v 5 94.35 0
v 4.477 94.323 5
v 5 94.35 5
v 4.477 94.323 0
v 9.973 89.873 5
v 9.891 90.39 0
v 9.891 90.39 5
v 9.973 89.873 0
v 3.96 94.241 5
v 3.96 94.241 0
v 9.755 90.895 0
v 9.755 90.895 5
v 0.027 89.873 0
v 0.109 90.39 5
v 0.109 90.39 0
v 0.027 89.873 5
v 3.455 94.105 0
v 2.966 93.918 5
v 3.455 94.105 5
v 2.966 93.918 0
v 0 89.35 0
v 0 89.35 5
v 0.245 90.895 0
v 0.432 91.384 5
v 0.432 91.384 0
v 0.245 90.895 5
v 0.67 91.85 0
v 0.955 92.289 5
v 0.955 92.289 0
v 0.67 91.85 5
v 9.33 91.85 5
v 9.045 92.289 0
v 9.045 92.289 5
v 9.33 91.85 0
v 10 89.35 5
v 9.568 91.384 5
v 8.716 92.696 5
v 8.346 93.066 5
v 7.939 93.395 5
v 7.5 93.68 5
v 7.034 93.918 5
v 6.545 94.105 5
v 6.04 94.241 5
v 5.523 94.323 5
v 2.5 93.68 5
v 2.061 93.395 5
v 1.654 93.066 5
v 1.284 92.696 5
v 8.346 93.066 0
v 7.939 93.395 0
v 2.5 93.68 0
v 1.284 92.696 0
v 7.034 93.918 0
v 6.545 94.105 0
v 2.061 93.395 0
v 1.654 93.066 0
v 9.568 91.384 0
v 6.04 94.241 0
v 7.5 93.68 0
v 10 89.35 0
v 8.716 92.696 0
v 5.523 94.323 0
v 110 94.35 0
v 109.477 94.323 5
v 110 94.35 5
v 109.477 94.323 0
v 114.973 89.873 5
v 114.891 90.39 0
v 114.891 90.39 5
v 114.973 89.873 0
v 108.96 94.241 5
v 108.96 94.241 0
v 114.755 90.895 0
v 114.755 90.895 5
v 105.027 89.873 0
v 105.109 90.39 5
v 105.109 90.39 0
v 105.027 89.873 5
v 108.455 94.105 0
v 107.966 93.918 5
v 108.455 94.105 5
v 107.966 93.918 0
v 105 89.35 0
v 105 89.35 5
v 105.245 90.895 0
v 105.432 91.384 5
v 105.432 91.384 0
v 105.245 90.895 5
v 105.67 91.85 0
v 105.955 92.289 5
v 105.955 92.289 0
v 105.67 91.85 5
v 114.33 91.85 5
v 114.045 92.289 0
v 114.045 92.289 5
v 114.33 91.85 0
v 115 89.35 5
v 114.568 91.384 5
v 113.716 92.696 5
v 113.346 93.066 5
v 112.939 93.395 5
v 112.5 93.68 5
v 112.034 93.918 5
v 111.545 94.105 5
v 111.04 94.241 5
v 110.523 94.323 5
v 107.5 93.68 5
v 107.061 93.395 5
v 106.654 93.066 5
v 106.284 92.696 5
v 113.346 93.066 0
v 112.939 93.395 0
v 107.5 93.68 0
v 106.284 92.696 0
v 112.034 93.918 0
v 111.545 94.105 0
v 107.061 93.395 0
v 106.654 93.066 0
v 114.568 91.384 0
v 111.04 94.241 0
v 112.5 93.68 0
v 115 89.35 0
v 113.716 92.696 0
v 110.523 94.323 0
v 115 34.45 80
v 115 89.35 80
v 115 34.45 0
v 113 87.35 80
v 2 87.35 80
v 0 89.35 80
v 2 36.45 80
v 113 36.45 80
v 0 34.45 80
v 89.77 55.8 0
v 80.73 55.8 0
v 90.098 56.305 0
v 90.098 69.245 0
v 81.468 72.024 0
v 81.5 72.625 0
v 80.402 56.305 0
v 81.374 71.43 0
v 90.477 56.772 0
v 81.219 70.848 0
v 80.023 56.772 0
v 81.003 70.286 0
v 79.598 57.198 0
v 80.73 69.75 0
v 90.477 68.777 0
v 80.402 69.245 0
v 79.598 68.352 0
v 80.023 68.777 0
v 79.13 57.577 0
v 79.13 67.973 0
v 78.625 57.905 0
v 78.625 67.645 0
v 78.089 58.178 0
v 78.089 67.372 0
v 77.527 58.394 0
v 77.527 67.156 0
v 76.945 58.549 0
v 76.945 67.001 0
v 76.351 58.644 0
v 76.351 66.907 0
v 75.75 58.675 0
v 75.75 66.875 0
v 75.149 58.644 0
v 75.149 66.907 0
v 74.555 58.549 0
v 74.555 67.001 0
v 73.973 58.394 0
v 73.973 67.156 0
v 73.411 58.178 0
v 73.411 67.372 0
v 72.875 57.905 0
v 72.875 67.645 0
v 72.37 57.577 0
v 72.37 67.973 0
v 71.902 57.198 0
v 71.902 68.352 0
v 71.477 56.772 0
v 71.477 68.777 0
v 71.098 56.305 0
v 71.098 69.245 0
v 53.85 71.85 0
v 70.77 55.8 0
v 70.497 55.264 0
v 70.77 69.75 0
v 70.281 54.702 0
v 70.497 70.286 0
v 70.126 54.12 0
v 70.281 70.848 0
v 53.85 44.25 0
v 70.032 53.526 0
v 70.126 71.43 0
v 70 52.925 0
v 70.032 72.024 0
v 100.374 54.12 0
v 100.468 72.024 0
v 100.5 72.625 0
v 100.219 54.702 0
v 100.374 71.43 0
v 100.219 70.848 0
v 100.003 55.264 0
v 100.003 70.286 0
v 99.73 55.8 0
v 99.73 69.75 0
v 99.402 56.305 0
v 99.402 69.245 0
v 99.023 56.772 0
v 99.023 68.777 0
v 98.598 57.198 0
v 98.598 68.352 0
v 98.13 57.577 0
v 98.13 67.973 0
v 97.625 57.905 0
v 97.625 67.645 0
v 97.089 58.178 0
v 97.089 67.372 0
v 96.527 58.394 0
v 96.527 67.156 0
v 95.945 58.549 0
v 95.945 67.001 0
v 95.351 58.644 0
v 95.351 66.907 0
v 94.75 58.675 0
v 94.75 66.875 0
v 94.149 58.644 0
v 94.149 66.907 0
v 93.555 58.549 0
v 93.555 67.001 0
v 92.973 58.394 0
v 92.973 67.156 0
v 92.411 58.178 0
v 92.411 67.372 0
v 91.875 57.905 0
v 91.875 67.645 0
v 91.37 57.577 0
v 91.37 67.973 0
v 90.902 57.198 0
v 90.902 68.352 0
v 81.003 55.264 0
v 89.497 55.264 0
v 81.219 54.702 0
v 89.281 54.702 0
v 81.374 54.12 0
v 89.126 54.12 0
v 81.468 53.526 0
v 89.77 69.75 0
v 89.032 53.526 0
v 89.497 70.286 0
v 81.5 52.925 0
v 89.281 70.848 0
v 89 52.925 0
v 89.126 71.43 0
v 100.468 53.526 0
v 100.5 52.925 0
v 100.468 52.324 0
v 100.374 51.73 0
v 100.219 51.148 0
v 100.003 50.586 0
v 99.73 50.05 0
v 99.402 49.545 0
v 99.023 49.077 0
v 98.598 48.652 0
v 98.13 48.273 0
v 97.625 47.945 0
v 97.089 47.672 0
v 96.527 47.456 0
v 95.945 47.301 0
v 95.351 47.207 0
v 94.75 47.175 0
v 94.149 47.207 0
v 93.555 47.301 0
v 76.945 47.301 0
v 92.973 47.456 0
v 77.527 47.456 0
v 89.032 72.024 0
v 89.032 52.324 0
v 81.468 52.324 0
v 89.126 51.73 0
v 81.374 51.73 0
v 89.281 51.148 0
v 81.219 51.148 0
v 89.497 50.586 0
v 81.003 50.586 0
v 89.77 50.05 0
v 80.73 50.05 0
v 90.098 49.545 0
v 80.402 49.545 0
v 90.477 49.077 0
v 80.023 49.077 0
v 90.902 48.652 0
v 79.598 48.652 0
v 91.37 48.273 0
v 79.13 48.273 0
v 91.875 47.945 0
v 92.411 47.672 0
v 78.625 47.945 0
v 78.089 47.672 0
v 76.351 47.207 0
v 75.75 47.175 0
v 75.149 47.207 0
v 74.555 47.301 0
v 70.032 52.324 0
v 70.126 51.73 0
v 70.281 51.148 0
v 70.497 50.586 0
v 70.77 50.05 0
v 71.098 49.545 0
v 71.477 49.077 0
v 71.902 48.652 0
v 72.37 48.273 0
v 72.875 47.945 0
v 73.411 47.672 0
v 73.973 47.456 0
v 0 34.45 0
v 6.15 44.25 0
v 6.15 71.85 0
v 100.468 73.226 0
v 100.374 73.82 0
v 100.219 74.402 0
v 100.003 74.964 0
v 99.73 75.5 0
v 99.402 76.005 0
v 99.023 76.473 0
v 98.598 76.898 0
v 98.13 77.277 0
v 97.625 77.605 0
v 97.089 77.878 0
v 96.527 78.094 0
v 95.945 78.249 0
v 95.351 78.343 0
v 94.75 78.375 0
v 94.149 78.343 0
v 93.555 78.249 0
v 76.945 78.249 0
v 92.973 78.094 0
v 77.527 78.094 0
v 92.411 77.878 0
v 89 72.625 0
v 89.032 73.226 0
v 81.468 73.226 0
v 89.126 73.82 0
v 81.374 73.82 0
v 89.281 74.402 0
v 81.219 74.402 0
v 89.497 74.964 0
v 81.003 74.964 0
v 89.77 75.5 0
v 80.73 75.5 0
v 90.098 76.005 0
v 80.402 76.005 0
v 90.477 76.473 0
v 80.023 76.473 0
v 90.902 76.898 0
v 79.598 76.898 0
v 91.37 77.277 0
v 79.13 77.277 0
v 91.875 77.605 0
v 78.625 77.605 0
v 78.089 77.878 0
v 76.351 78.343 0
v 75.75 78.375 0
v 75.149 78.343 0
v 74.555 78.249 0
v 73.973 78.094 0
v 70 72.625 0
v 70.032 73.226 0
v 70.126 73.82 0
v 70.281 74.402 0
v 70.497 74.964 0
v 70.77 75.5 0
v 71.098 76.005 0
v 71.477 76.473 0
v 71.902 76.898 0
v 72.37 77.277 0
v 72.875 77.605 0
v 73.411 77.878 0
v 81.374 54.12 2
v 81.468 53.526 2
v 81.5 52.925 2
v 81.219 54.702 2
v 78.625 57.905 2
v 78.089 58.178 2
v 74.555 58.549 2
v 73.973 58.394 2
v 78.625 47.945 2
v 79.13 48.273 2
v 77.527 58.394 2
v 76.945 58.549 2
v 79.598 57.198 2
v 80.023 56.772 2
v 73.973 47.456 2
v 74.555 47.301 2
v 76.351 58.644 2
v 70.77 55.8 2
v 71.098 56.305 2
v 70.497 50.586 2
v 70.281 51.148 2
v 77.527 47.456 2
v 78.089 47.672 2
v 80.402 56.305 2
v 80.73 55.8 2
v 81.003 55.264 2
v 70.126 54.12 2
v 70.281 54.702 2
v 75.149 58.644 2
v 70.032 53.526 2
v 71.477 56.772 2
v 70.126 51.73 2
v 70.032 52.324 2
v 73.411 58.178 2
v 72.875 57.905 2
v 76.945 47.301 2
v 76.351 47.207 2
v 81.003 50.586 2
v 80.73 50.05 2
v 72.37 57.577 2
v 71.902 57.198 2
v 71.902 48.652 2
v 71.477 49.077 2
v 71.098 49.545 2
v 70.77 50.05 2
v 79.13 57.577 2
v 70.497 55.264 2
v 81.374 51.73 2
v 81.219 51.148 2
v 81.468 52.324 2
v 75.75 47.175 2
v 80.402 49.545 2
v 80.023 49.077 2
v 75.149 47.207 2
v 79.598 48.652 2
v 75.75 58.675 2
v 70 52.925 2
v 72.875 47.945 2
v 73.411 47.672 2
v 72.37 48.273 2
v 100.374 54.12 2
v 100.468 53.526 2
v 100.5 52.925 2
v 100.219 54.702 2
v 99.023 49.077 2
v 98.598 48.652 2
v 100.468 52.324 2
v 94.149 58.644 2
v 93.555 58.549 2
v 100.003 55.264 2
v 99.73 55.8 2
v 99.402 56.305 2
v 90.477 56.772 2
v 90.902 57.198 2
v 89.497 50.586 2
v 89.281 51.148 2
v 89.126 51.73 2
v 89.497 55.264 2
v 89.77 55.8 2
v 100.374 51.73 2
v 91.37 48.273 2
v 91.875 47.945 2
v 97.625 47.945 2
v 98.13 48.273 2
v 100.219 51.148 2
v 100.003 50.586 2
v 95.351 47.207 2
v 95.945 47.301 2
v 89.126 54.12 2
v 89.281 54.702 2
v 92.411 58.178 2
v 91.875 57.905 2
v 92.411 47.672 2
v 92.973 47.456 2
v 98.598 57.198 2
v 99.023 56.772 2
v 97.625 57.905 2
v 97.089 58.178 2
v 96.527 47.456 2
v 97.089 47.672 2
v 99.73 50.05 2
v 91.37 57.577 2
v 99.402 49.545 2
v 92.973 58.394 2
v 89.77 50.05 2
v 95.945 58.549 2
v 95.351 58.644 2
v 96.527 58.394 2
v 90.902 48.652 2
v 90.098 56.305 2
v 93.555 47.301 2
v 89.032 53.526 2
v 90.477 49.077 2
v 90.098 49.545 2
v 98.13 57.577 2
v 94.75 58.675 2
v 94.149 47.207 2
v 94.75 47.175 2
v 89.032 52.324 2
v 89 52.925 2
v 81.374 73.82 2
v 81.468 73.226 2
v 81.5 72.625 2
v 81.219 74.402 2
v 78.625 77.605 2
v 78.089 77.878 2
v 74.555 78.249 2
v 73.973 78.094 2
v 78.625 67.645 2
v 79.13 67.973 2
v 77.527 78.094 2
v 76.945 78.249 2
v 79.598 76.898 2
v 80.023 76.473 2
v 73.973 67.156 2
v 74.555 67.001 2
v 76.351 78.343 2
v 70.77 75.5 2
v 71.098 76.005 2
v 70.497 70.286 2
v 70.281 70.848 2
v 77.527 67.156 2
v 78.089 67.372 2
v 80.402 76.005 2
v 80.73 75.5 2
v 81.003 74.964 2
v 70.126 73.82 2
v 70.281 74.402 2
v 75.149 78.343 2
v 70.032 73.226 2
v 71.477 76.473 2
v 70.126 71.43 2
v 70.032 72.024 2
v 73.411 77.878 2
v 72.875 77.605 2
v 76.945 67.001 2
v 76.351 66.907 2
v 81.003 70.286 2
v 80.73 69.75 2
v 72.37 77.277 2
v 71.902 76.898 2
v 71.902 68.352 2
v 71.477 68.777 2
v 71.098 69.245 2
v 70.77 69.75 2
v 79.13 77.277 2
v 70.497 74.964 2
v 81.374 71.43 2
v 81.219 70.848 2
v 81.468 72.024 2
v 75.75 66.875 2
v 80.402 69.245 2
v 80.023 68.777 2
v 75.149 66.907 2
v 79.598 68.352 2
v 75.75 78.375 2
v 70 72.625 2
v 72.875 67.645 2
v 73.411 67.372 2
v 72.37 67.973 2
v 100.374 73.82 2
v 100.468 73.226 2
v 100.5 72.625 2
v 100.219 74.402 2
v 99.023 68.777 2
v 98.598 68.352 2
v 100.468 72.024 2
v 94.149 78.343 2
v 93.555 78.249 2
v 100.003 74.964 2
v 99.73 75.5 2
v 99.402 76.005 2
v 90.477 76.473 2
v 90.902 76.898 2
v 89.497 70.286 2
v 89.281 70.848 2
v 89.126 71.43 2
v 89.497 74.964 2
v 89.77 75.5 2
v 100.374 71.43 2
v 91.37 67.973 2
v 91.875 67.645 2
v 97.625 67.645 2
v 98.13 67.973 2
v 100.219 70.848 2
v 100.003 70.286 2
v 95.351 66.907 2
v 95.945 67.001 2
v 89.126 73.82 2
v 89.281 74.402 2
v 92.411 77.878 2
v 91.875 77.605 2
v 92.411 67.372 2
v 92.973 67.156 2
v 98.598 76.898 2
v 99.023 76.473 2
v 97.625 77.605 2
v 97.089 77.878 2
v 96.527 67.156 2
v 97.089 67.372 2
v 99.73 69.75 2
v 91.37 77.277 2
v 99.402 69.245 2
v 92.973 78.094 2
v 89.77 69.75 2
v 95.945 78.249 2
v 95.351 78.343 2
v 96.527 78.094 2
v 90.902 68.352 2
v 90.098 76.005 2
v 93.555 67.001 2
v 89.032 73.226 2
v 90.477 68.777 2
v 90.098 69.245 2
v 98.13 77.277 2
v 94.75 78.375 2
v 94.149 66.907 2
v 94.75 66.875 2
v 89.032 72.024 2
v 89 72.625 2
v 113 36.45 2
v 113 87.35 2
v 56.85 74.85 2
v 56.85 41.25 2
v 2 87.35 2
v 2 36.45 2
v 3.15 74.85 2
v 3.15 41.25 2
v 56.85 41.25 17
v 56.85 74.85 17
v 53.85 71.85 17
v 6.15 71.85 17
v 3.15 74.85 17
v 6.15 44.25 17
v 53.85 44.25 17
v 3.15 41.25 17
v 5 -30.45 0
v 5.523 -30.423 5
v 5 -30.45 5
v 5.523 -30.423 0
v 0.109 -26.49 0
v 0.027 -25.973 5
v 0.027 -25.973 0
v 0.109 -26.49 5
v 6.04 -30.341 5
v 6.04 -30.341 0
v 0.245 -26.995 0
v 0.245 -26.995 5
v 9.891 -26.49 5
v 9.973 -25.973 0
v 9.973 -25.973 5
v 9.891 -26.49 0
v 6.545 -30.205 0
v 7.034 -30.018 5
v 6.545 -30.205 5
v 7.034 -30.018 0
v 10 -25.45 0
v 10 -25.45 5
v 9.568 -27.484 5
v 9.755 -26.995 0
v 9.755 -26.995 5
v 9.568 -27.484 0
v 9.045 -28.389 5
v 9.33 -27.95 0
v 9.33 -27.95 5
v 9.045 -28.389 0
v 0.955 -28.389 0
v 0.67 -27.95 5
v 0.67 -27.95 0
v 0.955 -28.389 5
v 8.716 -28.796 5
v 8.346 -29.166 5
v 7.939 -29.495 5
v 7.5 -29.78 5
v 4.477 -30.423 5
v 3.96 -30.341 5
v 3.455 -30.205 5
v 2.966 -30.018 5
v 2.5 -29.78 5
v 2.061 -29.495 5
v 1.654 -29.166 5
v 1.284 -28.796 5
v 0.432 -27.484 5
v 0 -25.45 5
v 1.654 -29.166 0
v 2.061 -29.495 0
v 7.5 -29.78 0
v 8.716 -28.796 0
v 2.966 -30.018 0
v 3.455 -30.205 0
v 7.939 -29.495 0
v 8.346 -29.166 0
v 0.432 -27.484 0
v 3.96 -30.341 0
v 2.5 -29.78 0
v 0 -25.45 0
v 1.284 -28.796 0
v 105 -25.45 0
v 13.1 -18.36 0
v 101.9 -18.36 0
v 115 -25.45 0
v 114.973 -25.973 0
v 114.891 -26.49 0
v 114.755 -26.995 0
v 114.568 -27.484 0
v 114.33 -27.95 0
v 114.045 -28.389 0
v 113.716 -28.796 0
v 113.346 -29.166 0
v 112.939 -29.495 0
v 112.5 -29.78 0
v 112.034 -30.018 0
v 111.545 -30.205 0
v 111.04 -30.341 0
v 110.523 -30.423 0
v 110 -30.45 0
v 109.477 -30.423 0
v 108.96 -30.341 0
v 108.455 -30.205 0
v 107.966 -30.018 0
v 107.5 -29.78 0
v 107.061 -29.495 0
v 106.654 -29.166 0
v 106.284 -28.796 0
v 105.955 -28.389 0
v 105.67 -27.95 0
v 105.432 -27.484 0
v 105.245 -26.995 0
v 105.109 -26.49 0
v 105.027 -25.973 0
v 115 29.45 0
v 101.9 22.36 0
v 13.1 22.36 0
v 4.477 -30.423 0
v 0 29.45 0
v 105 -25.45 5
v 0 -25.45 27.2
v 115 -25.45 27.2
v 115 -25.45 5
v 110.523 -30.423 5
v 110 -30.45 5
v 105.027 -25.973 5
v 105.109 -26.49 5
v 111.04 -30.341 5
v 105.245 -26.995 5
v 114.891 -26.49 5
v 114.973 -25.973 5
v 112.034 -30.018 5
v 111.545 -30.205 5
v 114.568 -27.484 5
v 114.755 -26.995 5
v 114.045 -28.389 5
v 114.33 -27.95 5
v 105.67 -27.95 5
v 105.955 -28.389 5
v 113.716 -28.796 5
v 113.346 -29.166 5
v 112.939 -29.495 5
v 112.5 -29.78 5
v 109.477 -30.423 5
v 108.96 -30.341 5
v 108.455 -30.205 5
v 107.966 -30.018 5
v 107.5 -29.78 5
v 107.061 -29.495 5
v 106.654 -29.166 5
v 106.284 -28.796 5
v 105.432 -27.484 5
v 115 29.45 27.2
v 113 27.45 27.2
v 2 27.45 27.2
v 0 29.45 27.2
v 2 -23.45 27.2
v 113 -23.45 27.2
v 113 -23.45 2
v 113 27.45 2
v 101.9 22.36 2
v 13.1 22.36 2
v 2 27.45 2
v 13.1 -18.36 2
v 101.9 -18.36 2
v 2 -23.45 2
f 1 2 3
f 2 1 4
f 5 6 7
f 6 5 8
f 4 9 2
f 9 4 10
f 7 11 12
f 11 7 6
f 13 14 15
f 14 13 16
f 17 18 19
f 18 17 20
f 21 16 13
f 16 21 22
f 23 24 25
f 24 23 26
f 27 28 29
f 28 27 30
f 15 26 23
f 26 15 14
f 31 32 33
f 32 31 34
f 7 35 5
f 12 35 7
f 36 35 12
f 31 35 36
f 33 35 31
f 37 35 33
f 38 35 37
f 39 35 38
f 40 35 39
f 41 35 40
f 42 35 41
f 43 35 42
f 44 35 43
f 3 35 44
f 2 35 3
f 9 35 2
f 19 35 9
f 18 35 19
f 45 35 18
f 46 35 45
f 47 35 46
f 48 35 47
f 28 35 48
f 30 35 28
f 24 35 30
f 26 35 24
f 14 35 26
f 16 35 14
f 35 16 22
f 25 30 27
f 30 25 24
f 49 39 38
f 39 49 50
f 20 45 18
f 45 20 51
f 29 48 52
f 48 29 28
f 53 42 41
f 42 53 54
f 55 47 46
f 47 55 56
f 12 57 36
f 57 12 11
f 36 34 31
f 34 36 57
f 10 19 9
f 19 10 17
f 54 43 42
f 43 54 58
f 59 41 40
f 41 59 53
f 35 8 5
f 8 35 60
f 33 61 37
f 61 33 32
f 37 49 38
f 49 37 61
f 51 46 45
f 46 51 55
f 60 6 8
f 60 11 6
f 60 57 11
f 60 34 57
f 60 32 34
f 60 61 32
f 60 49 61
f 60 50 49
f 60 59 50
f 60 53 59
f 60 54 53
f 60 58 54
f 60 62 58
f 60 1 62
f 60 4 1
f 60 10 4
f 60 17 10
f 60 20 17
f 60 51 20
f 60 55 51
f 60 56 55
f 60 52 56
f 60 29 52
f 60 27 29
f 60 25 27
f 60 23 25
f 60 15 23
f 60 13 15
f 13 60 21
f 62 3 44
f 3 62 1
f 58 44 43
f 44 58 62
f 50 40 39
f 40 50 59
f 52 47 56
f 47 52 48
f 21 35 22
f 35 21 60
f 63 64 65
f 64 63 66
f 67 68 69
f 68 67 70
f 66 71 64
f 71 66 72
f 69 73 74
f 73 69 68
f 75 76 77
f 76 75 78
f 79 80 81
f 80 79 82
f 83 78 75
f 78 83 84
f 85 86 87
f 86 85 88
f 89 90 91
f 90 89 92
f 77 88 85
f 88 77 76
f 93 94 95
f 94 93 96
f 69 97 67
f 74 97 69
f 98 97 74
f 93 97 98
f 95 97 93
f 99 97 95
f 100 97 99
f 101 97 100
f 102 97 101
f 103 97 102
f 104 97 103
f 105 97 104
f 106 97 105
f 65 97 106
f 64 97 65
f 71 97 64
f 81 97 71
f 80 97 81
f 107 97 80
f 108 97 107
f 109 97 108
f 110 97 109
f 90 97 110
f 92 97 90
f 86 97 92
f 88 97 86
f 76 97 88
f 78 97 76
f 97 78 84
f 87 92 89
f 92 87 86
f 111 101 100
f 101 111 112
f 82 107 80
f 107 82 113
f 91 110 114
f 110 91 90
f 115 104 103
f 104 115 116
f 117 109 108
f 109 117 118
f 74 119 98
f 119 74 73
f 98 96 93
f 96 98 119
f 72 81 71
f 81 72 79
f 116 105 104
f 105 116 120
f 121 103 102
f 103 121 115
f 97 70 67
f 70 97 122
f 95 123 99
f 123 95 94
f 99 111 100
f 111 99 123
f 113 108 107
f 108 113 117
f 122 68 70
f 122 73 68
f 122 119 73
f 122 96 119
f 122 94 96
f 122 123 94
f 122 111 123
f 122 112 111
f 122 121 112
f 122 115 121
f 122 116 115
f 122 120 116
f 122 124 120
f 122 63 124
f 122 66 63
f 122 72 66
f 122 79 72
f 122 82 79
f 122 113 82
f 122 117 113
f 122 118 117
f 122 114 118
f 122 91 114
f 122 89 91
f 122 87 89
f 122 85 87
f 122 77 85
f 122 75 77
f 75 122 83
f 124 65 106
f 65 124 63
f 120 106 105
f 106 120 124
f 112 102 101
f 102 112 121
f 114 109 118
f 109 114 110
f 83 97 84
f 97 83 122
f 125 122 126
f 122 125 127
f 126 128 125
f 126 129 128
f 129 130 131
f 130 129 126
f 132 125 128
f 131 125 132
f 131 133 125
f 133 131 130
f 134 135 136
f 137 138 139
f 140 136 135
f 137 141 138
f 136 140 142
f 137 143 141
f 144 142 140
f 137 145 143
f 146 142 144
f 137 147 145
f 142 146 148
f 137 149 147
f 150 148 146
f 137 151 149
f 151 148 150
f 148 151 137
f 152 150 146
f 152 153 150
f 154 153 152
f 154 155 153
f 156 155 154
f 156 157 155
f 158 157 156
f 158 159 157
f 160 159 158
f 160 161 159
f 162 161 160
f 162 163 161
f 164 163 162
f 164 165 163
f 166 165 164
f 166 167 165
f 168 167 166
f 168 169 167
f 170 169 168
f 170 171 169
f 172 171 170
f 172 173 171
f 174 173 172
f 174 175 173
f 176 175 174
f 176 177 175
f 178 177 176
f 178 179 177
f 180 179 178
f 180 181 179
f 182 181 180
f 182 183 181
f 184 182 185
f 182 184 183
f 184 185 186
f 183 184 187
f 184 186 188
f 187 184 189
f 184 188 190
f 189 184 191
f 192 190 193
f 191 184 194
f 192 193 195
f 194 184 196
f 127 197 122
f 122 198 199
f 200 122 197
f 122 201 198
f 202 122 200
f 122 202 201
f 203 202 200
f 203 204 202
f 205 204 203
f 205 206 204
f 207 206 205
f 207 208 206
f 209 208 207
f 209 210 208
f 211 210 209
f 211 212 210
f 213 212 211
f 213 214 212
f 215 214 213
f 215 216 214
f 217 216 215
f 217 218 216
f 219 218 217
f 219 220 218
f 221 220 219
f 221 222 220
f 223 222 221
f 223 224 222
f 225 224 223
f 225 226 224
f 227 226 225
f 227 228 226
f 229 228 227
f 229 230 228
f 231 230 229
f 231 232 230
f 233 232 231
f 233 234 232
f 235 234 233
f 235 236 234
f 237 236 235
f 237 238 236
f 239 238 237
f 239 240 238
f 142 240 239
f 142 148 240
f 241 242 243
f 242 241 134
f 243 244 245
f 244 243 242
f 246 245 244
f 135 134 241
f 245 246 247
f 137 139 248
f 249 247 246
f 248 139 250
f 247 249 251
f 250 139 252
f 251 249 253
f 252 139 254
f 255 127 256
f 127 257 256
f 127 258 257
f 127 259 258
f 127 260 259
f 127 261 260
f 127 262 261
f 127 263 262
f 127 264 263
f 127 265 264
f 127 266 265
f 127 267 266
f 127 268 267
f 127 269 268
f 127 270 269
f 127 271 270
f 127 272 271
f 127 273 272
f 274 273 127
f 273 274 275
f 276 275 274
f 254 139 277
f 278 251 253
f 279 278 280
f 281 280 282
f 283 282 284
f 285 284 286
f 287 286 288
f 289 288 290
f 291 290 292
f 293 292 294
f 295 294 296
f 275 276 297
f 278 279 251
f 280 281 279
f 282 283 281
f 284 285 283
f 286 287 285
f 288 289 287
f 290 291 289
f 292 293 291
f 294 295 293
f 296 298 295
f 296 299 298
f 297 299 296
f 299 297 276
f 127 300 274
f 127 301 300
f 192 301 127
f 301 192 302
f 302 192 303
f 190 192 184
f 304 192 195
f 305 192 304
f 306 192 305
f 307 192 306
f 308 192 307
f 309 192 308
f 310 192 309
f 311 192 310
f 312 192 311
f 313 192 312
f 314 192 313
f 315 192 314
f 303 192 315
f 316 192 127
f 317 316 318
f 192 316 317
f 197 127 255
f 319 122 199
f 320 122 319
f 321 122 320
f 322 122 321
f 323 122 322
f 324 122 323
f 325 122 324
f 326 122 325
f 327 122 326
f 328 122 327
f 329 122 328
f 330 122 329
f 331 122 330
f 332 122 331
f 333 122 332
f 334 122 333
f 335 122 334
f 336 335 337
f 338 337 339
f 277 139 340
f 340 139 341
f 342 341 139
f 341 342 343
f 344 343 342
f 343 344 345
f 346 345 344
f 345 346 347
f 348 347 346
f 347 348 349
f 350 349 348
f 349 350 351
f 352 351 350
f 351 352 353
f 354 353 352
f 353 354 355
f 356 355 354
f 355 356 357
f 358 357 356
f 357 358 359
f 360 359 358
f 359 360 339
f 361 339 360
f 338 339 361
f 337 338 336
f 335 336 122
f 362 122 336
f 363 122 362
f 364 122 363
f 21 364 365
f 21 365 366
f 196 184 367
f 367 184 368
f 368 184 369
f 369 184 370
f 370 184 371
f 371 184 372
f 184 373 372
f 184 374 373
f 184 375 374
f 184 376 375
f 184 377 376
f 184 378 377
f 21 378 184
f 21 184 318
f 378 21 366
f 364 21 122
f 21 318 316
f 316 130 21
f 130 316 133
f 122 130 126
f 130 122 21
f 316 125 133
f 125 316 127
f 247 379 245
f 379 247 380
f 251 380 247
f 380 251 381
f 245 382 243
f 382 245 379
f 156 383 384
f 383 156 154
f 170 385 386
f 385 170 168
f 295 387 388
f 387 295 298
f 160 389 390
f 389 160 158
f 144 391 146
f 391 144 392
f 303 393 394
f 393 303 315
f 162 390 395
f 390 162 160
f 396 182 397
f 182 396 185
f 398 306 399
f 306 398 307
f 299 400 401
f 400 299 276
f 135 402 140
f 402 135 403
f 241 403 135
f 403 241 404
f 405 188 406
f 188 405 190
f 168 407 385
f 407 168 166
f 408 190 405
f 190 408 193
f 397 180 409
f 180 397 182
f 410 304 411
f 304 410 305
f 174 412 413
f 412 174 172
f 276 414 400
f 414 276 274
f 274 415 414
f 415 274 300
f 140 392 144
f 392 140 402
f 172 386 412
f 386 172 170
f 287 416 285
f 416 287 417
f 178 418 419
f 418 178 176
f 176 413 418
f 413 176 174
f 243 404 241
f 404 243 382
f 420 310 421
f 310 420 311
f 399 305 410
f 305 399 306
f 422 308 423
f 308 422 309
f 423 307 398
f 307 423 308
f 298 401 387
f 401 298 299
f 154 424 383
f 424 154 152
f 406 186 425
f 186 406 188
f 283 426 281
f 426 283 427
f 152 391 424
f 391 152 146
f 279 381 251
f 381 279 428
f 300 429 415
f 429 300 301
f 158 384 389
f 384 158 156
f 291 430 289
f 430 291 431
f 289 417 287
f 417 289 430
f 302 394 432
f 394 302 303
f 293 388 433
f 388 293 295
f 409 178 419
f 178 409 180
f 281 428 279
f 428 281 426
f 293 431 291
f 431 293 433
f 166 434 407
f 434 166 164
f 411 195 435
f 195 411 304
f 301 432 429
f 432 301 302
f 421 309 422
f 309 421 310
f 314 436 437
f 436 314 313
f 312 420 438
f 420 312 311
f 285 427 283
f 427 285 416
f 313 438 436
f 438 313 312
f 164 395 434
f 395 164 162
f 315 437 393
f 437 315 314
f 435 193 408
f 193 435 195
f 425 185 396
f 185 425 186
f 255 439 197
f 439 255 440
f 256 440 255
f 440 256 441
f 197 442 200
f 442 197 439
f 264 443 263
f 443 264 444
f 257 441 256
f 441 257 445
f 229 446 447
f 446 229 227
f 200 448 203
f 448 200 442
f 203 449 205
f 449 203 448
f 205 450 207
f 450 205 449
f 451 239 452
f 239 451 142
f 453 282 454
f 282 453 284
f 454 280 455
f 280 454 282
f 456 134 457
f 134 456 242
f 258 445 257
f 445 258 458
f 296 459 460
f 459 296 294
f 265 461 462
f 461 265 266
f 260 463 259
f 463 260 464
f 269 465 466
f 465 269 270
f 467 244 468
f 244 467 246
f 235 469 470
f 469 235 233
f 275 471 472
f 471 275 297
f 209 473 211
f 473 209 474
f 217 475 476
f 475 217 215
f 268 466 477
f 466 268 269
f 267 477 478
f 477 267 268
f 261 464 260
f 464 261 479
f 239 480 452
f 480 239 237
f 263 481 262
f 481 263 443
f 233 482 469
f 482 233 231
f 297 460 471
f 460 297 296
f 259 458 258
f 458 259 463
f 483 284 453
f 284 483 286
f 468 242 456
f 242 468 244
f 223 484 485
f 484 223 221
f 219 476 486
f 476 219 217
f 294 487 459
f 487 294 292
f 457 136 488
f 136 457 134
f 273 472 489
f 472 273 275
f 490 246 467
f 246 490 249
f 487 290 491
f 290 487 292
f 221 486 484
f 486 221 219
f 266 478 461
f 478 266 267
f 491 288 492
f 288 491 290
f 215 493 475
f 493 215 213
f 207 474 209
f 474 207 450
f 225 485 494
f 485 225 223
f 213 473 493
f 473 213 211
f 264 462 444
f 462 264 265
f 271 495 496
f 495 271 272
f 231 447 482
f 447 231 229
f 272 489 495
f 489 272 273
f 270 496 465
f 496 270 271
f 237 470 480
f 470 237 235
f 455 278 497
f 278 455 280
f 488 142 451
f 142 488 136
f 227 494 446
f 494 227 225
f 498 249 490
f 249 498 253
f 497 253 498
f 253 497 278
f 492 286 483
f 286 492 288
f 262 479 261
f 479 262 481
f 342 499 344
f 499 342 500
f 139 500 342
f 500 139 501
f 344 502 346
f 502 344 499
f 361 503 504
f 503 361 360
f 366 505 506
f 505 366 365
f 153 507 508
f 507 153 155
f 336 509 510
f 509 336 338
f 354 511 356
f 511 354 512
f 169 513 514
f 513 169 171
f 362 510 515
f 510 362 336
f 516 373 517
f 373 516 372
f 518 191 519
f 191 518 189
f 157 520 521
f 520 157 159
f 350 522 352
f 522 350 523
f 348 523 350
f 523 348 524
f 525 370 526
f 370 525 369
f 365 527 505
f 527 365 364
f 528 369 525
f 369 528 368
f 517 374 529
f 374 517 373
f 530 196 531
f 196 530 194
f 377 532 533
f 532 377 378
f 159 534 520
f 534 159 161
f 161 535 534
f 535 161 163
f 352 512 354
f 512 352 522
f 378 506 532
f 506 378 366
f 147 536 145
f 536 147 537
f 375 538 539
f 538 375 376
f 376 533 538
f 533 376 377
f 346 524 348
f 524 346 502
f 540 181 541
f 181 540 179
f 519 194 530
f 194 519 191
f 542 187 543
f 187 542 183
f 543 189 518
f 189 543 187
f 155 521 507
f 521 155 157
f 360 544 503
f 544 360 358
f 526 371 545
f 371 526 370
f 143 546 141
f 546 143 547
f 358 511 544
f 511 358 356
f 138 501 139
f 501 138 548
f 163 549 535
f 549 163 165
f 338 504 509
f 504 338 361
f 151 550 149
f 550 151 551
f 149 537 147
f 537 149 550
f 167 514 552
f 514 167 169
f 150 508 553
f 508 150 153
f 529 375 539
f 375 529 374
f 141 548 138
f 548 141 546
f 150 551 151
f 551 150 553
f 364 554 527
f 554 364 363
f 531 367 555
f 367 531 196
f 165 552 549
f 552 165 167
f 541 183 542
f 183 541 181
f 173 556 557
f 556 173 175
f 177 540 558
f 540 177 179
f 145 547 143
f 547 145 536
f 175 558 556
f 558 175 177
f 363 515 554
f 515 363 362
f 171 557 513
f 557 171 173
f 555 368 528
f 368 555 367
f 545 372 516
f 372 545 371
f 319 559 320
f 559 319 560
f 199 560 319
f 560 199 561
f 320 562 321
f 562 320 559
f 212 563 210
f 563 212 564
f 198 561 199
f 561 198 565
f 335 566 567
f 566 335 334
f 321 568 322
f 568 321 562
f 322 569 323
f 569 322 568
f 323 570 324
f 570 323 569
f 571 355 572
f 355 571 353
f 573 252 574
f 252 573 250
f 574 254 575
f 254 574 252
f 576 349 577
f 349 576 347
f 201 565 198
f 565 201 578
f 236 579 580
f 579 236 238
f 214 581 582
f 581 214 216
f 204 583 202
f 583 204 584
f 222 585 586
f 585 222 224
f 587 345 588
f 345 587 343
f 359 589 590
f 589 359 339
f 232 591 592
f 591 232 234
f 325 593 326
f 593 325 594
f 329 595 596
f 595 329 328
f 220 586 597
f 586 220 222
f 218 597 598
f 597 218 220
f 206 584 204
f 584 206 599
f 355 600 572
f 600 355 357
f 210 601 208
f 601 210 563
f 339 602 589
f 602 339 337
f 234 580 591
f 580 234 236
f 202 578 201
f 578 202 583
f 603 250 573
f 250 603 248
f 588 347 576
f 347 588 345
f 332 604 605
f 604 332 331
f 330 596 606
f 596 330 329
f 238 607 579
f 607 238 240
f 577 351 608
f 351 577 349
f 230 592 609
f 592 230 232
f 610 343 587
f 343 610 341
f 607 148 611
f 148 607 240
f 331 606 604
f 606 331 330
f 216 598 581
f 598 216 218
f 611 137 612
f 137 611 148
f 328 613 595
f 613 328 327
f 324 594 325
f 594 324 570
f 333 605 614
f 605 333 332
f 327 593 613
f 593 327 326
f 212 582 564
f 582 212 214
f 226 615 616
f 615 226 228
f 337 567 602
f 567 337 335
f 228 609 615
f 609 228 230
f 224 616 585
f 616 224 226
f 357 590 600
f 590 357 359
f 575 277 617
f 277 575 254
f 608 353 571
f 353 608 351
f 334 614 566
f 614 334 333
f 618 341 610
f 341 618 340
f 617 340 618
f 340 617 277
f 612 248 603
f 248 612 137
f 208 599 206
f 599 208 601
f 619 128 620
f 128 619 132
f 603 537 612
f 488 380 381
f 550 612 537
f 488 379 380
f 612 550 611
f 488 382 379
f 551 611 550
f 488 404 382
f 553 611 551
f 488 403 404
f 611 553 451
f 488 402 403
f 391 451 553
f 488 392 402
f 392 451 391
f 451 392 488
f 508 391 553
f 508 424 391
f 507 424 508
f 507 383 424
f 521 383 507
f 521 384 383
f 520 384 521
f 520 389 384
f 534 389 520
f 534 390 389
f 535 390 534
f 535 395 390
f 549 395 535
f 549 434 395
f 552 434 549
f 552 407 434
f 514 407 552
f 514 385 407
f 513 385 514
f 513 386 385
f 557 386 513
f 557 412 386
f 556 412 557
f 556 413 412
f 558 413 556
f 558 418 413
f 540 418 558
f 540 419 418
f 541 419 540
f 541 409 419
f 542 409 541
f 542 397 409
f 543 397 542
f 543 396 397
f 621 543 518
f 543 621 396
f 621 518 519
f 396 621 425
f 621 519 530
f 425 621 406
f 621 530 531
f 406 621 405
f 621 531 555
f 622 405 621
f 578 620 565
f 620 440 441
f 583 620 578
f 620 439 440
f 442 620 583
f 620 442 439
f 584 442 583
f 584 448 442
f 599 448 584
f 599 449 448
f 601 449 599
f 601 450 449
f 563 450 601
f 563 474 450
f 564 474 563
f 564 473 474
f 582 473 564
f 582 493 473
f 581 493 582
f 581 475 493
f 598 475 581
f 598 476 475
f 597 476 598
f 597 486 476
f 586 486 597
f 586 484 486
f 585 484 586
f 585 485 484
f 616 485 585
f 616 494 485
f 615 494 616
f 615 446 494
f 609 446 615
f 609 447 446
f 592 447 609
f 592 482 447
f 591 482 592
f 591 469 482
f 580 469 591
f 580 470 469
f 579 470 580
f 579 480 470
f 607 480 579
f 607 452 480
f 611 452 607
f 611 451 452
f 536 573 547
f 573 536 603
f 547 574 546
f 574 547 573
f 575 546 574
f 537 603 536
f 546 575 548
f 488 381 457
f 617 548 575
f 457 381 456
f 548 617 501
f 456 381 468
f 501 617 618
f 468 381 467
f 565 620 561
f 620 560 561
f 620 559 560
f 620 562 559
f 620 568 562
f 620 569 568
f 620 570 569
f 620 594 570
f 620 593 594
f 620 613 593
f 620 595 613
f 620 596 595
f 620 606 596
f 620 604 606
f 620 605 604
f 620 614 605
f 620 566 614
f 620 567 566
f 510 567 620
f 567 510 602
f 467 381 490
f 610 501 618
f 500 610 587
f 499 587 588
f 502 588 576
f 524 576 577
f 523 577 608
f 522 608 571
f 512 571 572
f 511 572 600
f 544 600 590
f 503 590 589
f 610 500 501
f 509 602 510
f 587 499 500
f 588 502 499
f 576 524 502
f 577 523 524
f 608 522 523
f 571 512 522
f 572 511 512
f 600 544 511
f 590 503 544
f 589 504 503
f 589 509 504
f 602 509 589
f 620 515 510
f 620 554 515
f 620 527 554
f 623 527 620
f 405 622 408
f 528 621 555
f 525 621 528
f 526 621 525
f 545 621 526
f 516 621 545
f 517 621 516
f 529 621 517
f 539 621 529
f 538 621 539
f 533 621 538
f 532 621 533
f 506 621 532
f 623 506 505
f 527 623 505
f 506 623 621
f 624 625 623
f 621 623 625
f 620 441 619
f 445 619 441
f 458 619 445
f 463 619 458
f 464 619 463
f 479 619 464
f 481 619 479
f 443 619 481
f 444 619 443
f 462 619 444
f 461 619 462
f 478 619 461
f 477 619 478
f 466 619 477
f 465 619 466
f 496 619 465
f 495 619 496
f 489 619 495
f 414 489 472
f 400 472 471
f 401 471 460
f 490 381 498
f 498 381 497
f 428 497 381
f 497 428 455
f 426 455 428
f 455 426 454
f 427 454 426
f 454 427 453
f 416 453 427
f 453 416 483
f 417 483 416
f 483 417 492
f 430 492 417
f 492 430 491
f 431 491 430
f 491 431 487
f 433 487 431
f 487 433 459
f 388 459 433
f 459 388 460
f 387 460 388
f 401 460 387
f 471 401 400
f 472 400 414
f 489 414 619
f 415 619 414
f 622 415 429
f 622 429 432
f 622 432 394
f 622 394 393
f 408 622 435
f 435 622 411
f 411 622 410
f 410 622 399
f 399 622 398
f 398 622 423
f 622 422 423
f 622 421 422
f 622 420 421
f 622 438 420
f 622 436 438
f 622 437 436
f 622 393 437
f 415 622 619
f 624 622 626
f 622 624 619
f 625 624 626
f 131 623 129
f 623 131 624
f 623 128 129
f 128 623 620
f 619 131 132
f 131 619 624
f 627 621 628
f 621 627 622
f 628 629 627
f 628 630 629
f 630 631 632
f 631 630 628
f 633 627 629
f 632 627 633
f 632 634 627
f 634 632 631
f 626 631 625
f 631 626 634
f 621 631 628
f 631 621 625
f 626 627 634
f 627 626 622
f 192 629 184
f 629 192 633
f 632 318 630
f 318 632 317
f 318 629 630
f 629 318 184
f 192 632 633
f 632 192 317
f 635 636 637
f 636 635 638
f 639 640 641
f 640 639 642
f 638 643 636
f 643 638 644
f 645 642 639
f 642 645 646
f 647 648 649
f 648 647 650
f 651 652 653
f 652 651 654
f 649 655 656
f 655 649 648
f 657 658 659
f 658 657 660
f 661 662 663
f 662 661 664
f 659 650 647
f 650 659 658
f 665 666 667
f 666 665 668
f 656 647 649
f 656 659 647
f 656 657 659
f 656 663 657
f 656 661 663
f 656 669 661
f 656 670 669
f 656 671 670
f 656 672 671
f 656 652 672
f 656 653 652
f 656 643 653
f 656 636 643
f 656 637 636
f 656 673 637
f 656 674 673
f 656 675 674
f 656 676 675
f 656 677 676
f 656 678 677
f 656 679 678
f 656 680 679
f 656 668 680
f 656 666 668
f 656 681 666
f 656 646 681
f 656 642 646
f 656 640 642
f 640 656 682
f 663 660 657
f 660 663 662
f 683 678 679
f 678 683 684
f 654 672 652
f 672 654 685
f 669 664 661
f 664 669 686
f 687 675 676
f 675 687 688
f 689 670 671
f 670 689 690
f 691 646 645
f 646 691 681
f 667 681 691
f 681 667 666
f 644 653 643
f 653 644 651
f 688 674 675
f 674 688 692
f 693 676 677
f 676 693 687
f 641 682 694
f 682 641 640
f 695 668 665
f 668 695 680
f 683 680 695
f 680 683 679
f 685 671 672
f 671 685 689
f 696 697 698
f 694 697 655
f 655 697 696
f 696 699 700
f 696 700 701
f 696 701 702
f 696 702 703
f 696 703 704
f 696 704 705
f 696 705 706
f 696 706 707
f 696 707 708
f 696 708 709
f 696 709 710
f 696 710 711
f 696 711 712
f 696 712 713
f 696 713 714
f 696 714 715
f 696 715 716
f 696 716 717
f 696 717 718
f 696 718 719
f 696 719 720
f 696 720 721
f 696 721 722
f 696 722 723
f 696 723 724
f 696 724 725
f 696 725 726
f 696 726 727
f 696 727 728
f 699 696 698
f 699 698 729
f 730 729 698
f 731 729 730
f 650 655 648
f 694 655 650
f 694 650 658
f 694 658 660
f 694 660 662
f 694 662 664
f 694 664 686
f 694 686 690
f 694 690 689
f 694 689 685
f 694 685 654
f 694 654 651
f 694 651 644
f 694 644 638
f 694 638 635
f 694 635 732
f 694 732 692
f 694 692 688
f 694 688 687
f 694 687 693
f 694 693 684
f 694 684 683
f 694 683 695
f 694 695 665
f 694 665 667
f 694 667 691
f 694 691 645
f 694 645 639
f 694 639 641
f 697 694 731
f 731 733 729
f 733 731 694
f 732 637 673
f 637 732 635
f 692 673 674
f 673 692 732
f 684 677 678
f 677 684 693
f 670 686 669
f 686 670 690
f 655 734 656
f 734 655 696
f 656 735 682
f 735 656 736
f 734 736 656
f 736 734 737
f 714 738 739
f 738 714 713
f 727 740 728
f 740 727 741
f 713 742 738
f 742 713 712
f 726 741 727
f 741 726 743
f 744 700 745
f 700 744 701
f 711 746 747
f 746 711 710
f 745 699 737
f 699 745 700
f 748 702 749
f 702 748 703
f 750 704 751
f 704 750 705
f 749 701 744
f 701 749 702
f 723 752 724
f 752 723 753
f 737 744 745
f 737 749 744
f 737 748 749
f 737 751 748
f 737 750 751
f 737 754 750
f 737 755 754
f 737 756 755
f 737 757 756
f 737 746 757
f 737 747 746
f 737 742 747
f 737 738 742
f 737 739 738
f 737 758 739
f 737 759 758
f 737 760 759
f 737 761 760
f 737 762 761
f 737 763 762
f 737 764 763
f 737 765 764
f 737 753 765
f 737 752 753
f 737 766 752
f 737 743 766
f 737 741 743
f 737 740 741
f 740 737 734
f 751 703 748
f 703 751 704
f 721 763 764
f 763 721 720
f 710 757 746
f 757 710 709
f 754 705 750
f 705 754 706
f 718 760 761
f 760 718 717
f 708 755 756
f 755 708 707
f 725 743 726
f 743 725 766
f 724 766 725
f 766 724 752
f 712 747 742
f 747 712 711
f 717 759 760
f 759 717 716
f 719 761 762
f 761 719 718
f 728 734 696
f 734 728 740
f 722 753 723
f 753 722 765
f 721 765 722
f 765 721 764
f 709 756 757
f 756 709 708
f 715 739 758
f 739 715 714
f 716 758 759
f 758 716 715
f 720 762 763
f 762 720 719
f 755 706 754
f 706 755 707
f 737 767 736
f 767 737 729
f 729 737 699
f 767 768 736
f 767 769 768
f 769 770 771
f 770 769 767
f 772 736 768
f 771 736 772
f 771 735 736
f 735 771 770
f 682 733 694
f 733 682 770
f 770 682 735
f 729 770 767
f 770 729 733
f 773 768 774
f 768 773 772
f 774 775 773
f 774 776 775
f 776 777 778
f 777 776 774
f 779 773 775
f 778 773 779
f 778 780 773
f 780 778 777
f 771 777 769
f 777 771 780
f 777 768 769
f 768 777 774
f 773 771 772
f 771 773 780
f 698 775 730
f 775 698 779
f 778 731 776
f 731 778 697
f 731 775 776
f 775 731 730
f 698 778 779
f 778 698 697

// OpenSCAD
/* Open SCAD Name.: 
*  Copyright (c)..: 2016 www.DIY3DTech.com
*
*  Creation Date..:
*  Description....: PSU end covers
*
*  Rev 1: Base design: drcharlesbell@gmail.com
*  Rev 2: Modifcations by http://www.DIY3DTech.com
*
*  This program is free software; you can redistribute it and/or modify
*  it under the terms of the GNU General Public License as published by
*  the Free Software Foundation; either version 2 of the License, or
*  (at your option) any later version.
*
*  This program is distributed in the hope that it will be useful,
*  but WITHOUT ANY WARRANTY; without even the implied warranty of
*  MERCHANTABILITY or FITNESS FOR A PARTICULAR PURPOSE.  See the
*  GNU General Public License for more details.
*/

// Parts:
// Inlet Male Power Socket with Fuse Switch 10A 250V 3 Pin IEC320 C14
// http://amzn.to/2aMR5ve
//
// 10pcs Terminal Binding Post Power Amplifier Dual 2-way Banana Plug Jack
// http://amzn.to/2biVSaq

/*------------------Customizer View-------------------*/

// preview[view:north, tilt:top]

/*---------------------Parameters---------------------*/

// height of the PSU (add for plastic expansion)
height = 50.9;
// width of the PSU (add for plastic expansion)
width = 111;  
// depth for power-side cover (leave room for switch)
power_side_depth = 80;  //[1:1:100]
// depth for blank-side cover
blank_side_depth = 27.2;  //[1:1:100]
// length of power block
PWR_Block_len = 47.7;   
// height of power block
PWR_Block_height = 27.6;
// 0 = Round Opening 1 = Single Banna Jack 2 = Double Banna Jack
DC_Type = 2; //[0:Single Hole, 1:One Banna Jack Pair, 2:Two Banna Jack Pair]
// Outlet hole for DC power cord DC_Type = 0
DC_power_diameter = 8.0; //[1:1:10]


/*-----------------------Execute----------------------*/

translate ([0,(height/2)+9,0]) power_side();
translate ([0,-(height/2),0]) blank_side();


/*-----------------------Modules----------------------*/


module power_side() {
    
    difference() { //first order differance to add power block support
      
        union() {//start first union
        //create main unit
            difference() {
                union() {//start union second union
                    cube([width+4,height+4,power_side_depth]); 
        
                    //create feet
                    translate([5,(height-1)+5,0]) rotate([0,0,180]) foot();
                    translate([width-1,(height-1)+5,0]) rotate([0,0,180]) foot(); 

                        } //end second union  
             
            //start subtraction of difference
            translate([2,2,2]) cube([width,height,power_side_depth]);
                        
            // start if tree      
                if(DC_Type==0) translate([((((width/2)/2)-(19/2)+11.5))+(width/2),(height/2),-1]) rotate([0,0,0])  cylinder(6,DC_power_diameter/2,DC_power_diameter/2);
                else if(DC_Type==1)   translate([((((width/2)/2)-(19/2)+11.5))+(width/2),(height/2),-1]) rotate([0,0,0]) dual_banna_jack();
                else if(DC_Type==2)    {translate([((((width/2)/2)-(19/2)+11.5))+(width/2),((height/4)+(11.5/2)),-1]) rotate([0,0,0]) dual_banna_jack(); translate([((((width/2)/2)-(19/2)+11.5))+(width/2),(height/2)+(height/4),-1]) rotate([0,0,0]) dual_banna_jack();}
            // end if tree  

        } //end second difference 
            //create inter-support for power block to keep from moving
            translate([(30-((PWR_Block_len+6)/2)),((PWR_Block_height-6)/2)-4,0]) cube([PWR_Block_len+6,PWR_Block_height+6,17]);

  } //end first union 
       // power block cutout from support as well as primary box
        translate([(30-(PWR_Block_len/2)),(PWR_Block_height/2)-4,-1]) cube([PWR_Block_len,PWR_Block_height,22]); 
  
  } //end first difference 
}//end module power_side

module blank_side() {
  difference() {
      
        union() {//start union
            cube([width+4,height+4,blank_side_depth]);
             //create feet
            translate([5,0,0]) rotate([0,0,0]) foot();
            translate([width-1,0,0]) rotate([0,0,0]) foot();   
             } //end union 
             
    //start subtraction of difference
    //create center opening         
    translate([2,2,2]) cube([width,height,blank_side_depth]);
    //remove extra plastic from cover by making a hole 80% of the opening›         
    translate([(((width+4)/2)-((width*0.8)/2)),((height+4)/2)-((height*0.8)/2),-1]) cube([(width*0.8),(height*0.8),blank_side_depth]);
    
  }//end difference
}//end blank_side module

module foot() {
    //create tabed foot
    difference() {
            union() {//start union
                  translate([0,0,0]) rotate([0,0,0]) cylinder(5,10/2,10/2,$fn=60);
                    } //end union
    //start subtraction of difference
                  translate([-5,0,-2.5]) rotate([0,0,0]) cube([10,10,10]);
    } //end difference
}//end foot

module dual_banna_jack() {
    //create tabed foot
    difference() {
            union() {//start union
                  translate([-9.5,0,0]) rotate([0,0,0]) cylinder(10,11.5/2,11.5/2,$fn=60);
                  translate([9.5,0,0]) rotate([0,0,0]) cylinder(10,11.5/2,11.5/2,$fn=60);
                    } //end union
    //start any subtraction of difference below if needed
                 
    }//end difference
}//end foot
/*----------------------End Code----------------------*/
